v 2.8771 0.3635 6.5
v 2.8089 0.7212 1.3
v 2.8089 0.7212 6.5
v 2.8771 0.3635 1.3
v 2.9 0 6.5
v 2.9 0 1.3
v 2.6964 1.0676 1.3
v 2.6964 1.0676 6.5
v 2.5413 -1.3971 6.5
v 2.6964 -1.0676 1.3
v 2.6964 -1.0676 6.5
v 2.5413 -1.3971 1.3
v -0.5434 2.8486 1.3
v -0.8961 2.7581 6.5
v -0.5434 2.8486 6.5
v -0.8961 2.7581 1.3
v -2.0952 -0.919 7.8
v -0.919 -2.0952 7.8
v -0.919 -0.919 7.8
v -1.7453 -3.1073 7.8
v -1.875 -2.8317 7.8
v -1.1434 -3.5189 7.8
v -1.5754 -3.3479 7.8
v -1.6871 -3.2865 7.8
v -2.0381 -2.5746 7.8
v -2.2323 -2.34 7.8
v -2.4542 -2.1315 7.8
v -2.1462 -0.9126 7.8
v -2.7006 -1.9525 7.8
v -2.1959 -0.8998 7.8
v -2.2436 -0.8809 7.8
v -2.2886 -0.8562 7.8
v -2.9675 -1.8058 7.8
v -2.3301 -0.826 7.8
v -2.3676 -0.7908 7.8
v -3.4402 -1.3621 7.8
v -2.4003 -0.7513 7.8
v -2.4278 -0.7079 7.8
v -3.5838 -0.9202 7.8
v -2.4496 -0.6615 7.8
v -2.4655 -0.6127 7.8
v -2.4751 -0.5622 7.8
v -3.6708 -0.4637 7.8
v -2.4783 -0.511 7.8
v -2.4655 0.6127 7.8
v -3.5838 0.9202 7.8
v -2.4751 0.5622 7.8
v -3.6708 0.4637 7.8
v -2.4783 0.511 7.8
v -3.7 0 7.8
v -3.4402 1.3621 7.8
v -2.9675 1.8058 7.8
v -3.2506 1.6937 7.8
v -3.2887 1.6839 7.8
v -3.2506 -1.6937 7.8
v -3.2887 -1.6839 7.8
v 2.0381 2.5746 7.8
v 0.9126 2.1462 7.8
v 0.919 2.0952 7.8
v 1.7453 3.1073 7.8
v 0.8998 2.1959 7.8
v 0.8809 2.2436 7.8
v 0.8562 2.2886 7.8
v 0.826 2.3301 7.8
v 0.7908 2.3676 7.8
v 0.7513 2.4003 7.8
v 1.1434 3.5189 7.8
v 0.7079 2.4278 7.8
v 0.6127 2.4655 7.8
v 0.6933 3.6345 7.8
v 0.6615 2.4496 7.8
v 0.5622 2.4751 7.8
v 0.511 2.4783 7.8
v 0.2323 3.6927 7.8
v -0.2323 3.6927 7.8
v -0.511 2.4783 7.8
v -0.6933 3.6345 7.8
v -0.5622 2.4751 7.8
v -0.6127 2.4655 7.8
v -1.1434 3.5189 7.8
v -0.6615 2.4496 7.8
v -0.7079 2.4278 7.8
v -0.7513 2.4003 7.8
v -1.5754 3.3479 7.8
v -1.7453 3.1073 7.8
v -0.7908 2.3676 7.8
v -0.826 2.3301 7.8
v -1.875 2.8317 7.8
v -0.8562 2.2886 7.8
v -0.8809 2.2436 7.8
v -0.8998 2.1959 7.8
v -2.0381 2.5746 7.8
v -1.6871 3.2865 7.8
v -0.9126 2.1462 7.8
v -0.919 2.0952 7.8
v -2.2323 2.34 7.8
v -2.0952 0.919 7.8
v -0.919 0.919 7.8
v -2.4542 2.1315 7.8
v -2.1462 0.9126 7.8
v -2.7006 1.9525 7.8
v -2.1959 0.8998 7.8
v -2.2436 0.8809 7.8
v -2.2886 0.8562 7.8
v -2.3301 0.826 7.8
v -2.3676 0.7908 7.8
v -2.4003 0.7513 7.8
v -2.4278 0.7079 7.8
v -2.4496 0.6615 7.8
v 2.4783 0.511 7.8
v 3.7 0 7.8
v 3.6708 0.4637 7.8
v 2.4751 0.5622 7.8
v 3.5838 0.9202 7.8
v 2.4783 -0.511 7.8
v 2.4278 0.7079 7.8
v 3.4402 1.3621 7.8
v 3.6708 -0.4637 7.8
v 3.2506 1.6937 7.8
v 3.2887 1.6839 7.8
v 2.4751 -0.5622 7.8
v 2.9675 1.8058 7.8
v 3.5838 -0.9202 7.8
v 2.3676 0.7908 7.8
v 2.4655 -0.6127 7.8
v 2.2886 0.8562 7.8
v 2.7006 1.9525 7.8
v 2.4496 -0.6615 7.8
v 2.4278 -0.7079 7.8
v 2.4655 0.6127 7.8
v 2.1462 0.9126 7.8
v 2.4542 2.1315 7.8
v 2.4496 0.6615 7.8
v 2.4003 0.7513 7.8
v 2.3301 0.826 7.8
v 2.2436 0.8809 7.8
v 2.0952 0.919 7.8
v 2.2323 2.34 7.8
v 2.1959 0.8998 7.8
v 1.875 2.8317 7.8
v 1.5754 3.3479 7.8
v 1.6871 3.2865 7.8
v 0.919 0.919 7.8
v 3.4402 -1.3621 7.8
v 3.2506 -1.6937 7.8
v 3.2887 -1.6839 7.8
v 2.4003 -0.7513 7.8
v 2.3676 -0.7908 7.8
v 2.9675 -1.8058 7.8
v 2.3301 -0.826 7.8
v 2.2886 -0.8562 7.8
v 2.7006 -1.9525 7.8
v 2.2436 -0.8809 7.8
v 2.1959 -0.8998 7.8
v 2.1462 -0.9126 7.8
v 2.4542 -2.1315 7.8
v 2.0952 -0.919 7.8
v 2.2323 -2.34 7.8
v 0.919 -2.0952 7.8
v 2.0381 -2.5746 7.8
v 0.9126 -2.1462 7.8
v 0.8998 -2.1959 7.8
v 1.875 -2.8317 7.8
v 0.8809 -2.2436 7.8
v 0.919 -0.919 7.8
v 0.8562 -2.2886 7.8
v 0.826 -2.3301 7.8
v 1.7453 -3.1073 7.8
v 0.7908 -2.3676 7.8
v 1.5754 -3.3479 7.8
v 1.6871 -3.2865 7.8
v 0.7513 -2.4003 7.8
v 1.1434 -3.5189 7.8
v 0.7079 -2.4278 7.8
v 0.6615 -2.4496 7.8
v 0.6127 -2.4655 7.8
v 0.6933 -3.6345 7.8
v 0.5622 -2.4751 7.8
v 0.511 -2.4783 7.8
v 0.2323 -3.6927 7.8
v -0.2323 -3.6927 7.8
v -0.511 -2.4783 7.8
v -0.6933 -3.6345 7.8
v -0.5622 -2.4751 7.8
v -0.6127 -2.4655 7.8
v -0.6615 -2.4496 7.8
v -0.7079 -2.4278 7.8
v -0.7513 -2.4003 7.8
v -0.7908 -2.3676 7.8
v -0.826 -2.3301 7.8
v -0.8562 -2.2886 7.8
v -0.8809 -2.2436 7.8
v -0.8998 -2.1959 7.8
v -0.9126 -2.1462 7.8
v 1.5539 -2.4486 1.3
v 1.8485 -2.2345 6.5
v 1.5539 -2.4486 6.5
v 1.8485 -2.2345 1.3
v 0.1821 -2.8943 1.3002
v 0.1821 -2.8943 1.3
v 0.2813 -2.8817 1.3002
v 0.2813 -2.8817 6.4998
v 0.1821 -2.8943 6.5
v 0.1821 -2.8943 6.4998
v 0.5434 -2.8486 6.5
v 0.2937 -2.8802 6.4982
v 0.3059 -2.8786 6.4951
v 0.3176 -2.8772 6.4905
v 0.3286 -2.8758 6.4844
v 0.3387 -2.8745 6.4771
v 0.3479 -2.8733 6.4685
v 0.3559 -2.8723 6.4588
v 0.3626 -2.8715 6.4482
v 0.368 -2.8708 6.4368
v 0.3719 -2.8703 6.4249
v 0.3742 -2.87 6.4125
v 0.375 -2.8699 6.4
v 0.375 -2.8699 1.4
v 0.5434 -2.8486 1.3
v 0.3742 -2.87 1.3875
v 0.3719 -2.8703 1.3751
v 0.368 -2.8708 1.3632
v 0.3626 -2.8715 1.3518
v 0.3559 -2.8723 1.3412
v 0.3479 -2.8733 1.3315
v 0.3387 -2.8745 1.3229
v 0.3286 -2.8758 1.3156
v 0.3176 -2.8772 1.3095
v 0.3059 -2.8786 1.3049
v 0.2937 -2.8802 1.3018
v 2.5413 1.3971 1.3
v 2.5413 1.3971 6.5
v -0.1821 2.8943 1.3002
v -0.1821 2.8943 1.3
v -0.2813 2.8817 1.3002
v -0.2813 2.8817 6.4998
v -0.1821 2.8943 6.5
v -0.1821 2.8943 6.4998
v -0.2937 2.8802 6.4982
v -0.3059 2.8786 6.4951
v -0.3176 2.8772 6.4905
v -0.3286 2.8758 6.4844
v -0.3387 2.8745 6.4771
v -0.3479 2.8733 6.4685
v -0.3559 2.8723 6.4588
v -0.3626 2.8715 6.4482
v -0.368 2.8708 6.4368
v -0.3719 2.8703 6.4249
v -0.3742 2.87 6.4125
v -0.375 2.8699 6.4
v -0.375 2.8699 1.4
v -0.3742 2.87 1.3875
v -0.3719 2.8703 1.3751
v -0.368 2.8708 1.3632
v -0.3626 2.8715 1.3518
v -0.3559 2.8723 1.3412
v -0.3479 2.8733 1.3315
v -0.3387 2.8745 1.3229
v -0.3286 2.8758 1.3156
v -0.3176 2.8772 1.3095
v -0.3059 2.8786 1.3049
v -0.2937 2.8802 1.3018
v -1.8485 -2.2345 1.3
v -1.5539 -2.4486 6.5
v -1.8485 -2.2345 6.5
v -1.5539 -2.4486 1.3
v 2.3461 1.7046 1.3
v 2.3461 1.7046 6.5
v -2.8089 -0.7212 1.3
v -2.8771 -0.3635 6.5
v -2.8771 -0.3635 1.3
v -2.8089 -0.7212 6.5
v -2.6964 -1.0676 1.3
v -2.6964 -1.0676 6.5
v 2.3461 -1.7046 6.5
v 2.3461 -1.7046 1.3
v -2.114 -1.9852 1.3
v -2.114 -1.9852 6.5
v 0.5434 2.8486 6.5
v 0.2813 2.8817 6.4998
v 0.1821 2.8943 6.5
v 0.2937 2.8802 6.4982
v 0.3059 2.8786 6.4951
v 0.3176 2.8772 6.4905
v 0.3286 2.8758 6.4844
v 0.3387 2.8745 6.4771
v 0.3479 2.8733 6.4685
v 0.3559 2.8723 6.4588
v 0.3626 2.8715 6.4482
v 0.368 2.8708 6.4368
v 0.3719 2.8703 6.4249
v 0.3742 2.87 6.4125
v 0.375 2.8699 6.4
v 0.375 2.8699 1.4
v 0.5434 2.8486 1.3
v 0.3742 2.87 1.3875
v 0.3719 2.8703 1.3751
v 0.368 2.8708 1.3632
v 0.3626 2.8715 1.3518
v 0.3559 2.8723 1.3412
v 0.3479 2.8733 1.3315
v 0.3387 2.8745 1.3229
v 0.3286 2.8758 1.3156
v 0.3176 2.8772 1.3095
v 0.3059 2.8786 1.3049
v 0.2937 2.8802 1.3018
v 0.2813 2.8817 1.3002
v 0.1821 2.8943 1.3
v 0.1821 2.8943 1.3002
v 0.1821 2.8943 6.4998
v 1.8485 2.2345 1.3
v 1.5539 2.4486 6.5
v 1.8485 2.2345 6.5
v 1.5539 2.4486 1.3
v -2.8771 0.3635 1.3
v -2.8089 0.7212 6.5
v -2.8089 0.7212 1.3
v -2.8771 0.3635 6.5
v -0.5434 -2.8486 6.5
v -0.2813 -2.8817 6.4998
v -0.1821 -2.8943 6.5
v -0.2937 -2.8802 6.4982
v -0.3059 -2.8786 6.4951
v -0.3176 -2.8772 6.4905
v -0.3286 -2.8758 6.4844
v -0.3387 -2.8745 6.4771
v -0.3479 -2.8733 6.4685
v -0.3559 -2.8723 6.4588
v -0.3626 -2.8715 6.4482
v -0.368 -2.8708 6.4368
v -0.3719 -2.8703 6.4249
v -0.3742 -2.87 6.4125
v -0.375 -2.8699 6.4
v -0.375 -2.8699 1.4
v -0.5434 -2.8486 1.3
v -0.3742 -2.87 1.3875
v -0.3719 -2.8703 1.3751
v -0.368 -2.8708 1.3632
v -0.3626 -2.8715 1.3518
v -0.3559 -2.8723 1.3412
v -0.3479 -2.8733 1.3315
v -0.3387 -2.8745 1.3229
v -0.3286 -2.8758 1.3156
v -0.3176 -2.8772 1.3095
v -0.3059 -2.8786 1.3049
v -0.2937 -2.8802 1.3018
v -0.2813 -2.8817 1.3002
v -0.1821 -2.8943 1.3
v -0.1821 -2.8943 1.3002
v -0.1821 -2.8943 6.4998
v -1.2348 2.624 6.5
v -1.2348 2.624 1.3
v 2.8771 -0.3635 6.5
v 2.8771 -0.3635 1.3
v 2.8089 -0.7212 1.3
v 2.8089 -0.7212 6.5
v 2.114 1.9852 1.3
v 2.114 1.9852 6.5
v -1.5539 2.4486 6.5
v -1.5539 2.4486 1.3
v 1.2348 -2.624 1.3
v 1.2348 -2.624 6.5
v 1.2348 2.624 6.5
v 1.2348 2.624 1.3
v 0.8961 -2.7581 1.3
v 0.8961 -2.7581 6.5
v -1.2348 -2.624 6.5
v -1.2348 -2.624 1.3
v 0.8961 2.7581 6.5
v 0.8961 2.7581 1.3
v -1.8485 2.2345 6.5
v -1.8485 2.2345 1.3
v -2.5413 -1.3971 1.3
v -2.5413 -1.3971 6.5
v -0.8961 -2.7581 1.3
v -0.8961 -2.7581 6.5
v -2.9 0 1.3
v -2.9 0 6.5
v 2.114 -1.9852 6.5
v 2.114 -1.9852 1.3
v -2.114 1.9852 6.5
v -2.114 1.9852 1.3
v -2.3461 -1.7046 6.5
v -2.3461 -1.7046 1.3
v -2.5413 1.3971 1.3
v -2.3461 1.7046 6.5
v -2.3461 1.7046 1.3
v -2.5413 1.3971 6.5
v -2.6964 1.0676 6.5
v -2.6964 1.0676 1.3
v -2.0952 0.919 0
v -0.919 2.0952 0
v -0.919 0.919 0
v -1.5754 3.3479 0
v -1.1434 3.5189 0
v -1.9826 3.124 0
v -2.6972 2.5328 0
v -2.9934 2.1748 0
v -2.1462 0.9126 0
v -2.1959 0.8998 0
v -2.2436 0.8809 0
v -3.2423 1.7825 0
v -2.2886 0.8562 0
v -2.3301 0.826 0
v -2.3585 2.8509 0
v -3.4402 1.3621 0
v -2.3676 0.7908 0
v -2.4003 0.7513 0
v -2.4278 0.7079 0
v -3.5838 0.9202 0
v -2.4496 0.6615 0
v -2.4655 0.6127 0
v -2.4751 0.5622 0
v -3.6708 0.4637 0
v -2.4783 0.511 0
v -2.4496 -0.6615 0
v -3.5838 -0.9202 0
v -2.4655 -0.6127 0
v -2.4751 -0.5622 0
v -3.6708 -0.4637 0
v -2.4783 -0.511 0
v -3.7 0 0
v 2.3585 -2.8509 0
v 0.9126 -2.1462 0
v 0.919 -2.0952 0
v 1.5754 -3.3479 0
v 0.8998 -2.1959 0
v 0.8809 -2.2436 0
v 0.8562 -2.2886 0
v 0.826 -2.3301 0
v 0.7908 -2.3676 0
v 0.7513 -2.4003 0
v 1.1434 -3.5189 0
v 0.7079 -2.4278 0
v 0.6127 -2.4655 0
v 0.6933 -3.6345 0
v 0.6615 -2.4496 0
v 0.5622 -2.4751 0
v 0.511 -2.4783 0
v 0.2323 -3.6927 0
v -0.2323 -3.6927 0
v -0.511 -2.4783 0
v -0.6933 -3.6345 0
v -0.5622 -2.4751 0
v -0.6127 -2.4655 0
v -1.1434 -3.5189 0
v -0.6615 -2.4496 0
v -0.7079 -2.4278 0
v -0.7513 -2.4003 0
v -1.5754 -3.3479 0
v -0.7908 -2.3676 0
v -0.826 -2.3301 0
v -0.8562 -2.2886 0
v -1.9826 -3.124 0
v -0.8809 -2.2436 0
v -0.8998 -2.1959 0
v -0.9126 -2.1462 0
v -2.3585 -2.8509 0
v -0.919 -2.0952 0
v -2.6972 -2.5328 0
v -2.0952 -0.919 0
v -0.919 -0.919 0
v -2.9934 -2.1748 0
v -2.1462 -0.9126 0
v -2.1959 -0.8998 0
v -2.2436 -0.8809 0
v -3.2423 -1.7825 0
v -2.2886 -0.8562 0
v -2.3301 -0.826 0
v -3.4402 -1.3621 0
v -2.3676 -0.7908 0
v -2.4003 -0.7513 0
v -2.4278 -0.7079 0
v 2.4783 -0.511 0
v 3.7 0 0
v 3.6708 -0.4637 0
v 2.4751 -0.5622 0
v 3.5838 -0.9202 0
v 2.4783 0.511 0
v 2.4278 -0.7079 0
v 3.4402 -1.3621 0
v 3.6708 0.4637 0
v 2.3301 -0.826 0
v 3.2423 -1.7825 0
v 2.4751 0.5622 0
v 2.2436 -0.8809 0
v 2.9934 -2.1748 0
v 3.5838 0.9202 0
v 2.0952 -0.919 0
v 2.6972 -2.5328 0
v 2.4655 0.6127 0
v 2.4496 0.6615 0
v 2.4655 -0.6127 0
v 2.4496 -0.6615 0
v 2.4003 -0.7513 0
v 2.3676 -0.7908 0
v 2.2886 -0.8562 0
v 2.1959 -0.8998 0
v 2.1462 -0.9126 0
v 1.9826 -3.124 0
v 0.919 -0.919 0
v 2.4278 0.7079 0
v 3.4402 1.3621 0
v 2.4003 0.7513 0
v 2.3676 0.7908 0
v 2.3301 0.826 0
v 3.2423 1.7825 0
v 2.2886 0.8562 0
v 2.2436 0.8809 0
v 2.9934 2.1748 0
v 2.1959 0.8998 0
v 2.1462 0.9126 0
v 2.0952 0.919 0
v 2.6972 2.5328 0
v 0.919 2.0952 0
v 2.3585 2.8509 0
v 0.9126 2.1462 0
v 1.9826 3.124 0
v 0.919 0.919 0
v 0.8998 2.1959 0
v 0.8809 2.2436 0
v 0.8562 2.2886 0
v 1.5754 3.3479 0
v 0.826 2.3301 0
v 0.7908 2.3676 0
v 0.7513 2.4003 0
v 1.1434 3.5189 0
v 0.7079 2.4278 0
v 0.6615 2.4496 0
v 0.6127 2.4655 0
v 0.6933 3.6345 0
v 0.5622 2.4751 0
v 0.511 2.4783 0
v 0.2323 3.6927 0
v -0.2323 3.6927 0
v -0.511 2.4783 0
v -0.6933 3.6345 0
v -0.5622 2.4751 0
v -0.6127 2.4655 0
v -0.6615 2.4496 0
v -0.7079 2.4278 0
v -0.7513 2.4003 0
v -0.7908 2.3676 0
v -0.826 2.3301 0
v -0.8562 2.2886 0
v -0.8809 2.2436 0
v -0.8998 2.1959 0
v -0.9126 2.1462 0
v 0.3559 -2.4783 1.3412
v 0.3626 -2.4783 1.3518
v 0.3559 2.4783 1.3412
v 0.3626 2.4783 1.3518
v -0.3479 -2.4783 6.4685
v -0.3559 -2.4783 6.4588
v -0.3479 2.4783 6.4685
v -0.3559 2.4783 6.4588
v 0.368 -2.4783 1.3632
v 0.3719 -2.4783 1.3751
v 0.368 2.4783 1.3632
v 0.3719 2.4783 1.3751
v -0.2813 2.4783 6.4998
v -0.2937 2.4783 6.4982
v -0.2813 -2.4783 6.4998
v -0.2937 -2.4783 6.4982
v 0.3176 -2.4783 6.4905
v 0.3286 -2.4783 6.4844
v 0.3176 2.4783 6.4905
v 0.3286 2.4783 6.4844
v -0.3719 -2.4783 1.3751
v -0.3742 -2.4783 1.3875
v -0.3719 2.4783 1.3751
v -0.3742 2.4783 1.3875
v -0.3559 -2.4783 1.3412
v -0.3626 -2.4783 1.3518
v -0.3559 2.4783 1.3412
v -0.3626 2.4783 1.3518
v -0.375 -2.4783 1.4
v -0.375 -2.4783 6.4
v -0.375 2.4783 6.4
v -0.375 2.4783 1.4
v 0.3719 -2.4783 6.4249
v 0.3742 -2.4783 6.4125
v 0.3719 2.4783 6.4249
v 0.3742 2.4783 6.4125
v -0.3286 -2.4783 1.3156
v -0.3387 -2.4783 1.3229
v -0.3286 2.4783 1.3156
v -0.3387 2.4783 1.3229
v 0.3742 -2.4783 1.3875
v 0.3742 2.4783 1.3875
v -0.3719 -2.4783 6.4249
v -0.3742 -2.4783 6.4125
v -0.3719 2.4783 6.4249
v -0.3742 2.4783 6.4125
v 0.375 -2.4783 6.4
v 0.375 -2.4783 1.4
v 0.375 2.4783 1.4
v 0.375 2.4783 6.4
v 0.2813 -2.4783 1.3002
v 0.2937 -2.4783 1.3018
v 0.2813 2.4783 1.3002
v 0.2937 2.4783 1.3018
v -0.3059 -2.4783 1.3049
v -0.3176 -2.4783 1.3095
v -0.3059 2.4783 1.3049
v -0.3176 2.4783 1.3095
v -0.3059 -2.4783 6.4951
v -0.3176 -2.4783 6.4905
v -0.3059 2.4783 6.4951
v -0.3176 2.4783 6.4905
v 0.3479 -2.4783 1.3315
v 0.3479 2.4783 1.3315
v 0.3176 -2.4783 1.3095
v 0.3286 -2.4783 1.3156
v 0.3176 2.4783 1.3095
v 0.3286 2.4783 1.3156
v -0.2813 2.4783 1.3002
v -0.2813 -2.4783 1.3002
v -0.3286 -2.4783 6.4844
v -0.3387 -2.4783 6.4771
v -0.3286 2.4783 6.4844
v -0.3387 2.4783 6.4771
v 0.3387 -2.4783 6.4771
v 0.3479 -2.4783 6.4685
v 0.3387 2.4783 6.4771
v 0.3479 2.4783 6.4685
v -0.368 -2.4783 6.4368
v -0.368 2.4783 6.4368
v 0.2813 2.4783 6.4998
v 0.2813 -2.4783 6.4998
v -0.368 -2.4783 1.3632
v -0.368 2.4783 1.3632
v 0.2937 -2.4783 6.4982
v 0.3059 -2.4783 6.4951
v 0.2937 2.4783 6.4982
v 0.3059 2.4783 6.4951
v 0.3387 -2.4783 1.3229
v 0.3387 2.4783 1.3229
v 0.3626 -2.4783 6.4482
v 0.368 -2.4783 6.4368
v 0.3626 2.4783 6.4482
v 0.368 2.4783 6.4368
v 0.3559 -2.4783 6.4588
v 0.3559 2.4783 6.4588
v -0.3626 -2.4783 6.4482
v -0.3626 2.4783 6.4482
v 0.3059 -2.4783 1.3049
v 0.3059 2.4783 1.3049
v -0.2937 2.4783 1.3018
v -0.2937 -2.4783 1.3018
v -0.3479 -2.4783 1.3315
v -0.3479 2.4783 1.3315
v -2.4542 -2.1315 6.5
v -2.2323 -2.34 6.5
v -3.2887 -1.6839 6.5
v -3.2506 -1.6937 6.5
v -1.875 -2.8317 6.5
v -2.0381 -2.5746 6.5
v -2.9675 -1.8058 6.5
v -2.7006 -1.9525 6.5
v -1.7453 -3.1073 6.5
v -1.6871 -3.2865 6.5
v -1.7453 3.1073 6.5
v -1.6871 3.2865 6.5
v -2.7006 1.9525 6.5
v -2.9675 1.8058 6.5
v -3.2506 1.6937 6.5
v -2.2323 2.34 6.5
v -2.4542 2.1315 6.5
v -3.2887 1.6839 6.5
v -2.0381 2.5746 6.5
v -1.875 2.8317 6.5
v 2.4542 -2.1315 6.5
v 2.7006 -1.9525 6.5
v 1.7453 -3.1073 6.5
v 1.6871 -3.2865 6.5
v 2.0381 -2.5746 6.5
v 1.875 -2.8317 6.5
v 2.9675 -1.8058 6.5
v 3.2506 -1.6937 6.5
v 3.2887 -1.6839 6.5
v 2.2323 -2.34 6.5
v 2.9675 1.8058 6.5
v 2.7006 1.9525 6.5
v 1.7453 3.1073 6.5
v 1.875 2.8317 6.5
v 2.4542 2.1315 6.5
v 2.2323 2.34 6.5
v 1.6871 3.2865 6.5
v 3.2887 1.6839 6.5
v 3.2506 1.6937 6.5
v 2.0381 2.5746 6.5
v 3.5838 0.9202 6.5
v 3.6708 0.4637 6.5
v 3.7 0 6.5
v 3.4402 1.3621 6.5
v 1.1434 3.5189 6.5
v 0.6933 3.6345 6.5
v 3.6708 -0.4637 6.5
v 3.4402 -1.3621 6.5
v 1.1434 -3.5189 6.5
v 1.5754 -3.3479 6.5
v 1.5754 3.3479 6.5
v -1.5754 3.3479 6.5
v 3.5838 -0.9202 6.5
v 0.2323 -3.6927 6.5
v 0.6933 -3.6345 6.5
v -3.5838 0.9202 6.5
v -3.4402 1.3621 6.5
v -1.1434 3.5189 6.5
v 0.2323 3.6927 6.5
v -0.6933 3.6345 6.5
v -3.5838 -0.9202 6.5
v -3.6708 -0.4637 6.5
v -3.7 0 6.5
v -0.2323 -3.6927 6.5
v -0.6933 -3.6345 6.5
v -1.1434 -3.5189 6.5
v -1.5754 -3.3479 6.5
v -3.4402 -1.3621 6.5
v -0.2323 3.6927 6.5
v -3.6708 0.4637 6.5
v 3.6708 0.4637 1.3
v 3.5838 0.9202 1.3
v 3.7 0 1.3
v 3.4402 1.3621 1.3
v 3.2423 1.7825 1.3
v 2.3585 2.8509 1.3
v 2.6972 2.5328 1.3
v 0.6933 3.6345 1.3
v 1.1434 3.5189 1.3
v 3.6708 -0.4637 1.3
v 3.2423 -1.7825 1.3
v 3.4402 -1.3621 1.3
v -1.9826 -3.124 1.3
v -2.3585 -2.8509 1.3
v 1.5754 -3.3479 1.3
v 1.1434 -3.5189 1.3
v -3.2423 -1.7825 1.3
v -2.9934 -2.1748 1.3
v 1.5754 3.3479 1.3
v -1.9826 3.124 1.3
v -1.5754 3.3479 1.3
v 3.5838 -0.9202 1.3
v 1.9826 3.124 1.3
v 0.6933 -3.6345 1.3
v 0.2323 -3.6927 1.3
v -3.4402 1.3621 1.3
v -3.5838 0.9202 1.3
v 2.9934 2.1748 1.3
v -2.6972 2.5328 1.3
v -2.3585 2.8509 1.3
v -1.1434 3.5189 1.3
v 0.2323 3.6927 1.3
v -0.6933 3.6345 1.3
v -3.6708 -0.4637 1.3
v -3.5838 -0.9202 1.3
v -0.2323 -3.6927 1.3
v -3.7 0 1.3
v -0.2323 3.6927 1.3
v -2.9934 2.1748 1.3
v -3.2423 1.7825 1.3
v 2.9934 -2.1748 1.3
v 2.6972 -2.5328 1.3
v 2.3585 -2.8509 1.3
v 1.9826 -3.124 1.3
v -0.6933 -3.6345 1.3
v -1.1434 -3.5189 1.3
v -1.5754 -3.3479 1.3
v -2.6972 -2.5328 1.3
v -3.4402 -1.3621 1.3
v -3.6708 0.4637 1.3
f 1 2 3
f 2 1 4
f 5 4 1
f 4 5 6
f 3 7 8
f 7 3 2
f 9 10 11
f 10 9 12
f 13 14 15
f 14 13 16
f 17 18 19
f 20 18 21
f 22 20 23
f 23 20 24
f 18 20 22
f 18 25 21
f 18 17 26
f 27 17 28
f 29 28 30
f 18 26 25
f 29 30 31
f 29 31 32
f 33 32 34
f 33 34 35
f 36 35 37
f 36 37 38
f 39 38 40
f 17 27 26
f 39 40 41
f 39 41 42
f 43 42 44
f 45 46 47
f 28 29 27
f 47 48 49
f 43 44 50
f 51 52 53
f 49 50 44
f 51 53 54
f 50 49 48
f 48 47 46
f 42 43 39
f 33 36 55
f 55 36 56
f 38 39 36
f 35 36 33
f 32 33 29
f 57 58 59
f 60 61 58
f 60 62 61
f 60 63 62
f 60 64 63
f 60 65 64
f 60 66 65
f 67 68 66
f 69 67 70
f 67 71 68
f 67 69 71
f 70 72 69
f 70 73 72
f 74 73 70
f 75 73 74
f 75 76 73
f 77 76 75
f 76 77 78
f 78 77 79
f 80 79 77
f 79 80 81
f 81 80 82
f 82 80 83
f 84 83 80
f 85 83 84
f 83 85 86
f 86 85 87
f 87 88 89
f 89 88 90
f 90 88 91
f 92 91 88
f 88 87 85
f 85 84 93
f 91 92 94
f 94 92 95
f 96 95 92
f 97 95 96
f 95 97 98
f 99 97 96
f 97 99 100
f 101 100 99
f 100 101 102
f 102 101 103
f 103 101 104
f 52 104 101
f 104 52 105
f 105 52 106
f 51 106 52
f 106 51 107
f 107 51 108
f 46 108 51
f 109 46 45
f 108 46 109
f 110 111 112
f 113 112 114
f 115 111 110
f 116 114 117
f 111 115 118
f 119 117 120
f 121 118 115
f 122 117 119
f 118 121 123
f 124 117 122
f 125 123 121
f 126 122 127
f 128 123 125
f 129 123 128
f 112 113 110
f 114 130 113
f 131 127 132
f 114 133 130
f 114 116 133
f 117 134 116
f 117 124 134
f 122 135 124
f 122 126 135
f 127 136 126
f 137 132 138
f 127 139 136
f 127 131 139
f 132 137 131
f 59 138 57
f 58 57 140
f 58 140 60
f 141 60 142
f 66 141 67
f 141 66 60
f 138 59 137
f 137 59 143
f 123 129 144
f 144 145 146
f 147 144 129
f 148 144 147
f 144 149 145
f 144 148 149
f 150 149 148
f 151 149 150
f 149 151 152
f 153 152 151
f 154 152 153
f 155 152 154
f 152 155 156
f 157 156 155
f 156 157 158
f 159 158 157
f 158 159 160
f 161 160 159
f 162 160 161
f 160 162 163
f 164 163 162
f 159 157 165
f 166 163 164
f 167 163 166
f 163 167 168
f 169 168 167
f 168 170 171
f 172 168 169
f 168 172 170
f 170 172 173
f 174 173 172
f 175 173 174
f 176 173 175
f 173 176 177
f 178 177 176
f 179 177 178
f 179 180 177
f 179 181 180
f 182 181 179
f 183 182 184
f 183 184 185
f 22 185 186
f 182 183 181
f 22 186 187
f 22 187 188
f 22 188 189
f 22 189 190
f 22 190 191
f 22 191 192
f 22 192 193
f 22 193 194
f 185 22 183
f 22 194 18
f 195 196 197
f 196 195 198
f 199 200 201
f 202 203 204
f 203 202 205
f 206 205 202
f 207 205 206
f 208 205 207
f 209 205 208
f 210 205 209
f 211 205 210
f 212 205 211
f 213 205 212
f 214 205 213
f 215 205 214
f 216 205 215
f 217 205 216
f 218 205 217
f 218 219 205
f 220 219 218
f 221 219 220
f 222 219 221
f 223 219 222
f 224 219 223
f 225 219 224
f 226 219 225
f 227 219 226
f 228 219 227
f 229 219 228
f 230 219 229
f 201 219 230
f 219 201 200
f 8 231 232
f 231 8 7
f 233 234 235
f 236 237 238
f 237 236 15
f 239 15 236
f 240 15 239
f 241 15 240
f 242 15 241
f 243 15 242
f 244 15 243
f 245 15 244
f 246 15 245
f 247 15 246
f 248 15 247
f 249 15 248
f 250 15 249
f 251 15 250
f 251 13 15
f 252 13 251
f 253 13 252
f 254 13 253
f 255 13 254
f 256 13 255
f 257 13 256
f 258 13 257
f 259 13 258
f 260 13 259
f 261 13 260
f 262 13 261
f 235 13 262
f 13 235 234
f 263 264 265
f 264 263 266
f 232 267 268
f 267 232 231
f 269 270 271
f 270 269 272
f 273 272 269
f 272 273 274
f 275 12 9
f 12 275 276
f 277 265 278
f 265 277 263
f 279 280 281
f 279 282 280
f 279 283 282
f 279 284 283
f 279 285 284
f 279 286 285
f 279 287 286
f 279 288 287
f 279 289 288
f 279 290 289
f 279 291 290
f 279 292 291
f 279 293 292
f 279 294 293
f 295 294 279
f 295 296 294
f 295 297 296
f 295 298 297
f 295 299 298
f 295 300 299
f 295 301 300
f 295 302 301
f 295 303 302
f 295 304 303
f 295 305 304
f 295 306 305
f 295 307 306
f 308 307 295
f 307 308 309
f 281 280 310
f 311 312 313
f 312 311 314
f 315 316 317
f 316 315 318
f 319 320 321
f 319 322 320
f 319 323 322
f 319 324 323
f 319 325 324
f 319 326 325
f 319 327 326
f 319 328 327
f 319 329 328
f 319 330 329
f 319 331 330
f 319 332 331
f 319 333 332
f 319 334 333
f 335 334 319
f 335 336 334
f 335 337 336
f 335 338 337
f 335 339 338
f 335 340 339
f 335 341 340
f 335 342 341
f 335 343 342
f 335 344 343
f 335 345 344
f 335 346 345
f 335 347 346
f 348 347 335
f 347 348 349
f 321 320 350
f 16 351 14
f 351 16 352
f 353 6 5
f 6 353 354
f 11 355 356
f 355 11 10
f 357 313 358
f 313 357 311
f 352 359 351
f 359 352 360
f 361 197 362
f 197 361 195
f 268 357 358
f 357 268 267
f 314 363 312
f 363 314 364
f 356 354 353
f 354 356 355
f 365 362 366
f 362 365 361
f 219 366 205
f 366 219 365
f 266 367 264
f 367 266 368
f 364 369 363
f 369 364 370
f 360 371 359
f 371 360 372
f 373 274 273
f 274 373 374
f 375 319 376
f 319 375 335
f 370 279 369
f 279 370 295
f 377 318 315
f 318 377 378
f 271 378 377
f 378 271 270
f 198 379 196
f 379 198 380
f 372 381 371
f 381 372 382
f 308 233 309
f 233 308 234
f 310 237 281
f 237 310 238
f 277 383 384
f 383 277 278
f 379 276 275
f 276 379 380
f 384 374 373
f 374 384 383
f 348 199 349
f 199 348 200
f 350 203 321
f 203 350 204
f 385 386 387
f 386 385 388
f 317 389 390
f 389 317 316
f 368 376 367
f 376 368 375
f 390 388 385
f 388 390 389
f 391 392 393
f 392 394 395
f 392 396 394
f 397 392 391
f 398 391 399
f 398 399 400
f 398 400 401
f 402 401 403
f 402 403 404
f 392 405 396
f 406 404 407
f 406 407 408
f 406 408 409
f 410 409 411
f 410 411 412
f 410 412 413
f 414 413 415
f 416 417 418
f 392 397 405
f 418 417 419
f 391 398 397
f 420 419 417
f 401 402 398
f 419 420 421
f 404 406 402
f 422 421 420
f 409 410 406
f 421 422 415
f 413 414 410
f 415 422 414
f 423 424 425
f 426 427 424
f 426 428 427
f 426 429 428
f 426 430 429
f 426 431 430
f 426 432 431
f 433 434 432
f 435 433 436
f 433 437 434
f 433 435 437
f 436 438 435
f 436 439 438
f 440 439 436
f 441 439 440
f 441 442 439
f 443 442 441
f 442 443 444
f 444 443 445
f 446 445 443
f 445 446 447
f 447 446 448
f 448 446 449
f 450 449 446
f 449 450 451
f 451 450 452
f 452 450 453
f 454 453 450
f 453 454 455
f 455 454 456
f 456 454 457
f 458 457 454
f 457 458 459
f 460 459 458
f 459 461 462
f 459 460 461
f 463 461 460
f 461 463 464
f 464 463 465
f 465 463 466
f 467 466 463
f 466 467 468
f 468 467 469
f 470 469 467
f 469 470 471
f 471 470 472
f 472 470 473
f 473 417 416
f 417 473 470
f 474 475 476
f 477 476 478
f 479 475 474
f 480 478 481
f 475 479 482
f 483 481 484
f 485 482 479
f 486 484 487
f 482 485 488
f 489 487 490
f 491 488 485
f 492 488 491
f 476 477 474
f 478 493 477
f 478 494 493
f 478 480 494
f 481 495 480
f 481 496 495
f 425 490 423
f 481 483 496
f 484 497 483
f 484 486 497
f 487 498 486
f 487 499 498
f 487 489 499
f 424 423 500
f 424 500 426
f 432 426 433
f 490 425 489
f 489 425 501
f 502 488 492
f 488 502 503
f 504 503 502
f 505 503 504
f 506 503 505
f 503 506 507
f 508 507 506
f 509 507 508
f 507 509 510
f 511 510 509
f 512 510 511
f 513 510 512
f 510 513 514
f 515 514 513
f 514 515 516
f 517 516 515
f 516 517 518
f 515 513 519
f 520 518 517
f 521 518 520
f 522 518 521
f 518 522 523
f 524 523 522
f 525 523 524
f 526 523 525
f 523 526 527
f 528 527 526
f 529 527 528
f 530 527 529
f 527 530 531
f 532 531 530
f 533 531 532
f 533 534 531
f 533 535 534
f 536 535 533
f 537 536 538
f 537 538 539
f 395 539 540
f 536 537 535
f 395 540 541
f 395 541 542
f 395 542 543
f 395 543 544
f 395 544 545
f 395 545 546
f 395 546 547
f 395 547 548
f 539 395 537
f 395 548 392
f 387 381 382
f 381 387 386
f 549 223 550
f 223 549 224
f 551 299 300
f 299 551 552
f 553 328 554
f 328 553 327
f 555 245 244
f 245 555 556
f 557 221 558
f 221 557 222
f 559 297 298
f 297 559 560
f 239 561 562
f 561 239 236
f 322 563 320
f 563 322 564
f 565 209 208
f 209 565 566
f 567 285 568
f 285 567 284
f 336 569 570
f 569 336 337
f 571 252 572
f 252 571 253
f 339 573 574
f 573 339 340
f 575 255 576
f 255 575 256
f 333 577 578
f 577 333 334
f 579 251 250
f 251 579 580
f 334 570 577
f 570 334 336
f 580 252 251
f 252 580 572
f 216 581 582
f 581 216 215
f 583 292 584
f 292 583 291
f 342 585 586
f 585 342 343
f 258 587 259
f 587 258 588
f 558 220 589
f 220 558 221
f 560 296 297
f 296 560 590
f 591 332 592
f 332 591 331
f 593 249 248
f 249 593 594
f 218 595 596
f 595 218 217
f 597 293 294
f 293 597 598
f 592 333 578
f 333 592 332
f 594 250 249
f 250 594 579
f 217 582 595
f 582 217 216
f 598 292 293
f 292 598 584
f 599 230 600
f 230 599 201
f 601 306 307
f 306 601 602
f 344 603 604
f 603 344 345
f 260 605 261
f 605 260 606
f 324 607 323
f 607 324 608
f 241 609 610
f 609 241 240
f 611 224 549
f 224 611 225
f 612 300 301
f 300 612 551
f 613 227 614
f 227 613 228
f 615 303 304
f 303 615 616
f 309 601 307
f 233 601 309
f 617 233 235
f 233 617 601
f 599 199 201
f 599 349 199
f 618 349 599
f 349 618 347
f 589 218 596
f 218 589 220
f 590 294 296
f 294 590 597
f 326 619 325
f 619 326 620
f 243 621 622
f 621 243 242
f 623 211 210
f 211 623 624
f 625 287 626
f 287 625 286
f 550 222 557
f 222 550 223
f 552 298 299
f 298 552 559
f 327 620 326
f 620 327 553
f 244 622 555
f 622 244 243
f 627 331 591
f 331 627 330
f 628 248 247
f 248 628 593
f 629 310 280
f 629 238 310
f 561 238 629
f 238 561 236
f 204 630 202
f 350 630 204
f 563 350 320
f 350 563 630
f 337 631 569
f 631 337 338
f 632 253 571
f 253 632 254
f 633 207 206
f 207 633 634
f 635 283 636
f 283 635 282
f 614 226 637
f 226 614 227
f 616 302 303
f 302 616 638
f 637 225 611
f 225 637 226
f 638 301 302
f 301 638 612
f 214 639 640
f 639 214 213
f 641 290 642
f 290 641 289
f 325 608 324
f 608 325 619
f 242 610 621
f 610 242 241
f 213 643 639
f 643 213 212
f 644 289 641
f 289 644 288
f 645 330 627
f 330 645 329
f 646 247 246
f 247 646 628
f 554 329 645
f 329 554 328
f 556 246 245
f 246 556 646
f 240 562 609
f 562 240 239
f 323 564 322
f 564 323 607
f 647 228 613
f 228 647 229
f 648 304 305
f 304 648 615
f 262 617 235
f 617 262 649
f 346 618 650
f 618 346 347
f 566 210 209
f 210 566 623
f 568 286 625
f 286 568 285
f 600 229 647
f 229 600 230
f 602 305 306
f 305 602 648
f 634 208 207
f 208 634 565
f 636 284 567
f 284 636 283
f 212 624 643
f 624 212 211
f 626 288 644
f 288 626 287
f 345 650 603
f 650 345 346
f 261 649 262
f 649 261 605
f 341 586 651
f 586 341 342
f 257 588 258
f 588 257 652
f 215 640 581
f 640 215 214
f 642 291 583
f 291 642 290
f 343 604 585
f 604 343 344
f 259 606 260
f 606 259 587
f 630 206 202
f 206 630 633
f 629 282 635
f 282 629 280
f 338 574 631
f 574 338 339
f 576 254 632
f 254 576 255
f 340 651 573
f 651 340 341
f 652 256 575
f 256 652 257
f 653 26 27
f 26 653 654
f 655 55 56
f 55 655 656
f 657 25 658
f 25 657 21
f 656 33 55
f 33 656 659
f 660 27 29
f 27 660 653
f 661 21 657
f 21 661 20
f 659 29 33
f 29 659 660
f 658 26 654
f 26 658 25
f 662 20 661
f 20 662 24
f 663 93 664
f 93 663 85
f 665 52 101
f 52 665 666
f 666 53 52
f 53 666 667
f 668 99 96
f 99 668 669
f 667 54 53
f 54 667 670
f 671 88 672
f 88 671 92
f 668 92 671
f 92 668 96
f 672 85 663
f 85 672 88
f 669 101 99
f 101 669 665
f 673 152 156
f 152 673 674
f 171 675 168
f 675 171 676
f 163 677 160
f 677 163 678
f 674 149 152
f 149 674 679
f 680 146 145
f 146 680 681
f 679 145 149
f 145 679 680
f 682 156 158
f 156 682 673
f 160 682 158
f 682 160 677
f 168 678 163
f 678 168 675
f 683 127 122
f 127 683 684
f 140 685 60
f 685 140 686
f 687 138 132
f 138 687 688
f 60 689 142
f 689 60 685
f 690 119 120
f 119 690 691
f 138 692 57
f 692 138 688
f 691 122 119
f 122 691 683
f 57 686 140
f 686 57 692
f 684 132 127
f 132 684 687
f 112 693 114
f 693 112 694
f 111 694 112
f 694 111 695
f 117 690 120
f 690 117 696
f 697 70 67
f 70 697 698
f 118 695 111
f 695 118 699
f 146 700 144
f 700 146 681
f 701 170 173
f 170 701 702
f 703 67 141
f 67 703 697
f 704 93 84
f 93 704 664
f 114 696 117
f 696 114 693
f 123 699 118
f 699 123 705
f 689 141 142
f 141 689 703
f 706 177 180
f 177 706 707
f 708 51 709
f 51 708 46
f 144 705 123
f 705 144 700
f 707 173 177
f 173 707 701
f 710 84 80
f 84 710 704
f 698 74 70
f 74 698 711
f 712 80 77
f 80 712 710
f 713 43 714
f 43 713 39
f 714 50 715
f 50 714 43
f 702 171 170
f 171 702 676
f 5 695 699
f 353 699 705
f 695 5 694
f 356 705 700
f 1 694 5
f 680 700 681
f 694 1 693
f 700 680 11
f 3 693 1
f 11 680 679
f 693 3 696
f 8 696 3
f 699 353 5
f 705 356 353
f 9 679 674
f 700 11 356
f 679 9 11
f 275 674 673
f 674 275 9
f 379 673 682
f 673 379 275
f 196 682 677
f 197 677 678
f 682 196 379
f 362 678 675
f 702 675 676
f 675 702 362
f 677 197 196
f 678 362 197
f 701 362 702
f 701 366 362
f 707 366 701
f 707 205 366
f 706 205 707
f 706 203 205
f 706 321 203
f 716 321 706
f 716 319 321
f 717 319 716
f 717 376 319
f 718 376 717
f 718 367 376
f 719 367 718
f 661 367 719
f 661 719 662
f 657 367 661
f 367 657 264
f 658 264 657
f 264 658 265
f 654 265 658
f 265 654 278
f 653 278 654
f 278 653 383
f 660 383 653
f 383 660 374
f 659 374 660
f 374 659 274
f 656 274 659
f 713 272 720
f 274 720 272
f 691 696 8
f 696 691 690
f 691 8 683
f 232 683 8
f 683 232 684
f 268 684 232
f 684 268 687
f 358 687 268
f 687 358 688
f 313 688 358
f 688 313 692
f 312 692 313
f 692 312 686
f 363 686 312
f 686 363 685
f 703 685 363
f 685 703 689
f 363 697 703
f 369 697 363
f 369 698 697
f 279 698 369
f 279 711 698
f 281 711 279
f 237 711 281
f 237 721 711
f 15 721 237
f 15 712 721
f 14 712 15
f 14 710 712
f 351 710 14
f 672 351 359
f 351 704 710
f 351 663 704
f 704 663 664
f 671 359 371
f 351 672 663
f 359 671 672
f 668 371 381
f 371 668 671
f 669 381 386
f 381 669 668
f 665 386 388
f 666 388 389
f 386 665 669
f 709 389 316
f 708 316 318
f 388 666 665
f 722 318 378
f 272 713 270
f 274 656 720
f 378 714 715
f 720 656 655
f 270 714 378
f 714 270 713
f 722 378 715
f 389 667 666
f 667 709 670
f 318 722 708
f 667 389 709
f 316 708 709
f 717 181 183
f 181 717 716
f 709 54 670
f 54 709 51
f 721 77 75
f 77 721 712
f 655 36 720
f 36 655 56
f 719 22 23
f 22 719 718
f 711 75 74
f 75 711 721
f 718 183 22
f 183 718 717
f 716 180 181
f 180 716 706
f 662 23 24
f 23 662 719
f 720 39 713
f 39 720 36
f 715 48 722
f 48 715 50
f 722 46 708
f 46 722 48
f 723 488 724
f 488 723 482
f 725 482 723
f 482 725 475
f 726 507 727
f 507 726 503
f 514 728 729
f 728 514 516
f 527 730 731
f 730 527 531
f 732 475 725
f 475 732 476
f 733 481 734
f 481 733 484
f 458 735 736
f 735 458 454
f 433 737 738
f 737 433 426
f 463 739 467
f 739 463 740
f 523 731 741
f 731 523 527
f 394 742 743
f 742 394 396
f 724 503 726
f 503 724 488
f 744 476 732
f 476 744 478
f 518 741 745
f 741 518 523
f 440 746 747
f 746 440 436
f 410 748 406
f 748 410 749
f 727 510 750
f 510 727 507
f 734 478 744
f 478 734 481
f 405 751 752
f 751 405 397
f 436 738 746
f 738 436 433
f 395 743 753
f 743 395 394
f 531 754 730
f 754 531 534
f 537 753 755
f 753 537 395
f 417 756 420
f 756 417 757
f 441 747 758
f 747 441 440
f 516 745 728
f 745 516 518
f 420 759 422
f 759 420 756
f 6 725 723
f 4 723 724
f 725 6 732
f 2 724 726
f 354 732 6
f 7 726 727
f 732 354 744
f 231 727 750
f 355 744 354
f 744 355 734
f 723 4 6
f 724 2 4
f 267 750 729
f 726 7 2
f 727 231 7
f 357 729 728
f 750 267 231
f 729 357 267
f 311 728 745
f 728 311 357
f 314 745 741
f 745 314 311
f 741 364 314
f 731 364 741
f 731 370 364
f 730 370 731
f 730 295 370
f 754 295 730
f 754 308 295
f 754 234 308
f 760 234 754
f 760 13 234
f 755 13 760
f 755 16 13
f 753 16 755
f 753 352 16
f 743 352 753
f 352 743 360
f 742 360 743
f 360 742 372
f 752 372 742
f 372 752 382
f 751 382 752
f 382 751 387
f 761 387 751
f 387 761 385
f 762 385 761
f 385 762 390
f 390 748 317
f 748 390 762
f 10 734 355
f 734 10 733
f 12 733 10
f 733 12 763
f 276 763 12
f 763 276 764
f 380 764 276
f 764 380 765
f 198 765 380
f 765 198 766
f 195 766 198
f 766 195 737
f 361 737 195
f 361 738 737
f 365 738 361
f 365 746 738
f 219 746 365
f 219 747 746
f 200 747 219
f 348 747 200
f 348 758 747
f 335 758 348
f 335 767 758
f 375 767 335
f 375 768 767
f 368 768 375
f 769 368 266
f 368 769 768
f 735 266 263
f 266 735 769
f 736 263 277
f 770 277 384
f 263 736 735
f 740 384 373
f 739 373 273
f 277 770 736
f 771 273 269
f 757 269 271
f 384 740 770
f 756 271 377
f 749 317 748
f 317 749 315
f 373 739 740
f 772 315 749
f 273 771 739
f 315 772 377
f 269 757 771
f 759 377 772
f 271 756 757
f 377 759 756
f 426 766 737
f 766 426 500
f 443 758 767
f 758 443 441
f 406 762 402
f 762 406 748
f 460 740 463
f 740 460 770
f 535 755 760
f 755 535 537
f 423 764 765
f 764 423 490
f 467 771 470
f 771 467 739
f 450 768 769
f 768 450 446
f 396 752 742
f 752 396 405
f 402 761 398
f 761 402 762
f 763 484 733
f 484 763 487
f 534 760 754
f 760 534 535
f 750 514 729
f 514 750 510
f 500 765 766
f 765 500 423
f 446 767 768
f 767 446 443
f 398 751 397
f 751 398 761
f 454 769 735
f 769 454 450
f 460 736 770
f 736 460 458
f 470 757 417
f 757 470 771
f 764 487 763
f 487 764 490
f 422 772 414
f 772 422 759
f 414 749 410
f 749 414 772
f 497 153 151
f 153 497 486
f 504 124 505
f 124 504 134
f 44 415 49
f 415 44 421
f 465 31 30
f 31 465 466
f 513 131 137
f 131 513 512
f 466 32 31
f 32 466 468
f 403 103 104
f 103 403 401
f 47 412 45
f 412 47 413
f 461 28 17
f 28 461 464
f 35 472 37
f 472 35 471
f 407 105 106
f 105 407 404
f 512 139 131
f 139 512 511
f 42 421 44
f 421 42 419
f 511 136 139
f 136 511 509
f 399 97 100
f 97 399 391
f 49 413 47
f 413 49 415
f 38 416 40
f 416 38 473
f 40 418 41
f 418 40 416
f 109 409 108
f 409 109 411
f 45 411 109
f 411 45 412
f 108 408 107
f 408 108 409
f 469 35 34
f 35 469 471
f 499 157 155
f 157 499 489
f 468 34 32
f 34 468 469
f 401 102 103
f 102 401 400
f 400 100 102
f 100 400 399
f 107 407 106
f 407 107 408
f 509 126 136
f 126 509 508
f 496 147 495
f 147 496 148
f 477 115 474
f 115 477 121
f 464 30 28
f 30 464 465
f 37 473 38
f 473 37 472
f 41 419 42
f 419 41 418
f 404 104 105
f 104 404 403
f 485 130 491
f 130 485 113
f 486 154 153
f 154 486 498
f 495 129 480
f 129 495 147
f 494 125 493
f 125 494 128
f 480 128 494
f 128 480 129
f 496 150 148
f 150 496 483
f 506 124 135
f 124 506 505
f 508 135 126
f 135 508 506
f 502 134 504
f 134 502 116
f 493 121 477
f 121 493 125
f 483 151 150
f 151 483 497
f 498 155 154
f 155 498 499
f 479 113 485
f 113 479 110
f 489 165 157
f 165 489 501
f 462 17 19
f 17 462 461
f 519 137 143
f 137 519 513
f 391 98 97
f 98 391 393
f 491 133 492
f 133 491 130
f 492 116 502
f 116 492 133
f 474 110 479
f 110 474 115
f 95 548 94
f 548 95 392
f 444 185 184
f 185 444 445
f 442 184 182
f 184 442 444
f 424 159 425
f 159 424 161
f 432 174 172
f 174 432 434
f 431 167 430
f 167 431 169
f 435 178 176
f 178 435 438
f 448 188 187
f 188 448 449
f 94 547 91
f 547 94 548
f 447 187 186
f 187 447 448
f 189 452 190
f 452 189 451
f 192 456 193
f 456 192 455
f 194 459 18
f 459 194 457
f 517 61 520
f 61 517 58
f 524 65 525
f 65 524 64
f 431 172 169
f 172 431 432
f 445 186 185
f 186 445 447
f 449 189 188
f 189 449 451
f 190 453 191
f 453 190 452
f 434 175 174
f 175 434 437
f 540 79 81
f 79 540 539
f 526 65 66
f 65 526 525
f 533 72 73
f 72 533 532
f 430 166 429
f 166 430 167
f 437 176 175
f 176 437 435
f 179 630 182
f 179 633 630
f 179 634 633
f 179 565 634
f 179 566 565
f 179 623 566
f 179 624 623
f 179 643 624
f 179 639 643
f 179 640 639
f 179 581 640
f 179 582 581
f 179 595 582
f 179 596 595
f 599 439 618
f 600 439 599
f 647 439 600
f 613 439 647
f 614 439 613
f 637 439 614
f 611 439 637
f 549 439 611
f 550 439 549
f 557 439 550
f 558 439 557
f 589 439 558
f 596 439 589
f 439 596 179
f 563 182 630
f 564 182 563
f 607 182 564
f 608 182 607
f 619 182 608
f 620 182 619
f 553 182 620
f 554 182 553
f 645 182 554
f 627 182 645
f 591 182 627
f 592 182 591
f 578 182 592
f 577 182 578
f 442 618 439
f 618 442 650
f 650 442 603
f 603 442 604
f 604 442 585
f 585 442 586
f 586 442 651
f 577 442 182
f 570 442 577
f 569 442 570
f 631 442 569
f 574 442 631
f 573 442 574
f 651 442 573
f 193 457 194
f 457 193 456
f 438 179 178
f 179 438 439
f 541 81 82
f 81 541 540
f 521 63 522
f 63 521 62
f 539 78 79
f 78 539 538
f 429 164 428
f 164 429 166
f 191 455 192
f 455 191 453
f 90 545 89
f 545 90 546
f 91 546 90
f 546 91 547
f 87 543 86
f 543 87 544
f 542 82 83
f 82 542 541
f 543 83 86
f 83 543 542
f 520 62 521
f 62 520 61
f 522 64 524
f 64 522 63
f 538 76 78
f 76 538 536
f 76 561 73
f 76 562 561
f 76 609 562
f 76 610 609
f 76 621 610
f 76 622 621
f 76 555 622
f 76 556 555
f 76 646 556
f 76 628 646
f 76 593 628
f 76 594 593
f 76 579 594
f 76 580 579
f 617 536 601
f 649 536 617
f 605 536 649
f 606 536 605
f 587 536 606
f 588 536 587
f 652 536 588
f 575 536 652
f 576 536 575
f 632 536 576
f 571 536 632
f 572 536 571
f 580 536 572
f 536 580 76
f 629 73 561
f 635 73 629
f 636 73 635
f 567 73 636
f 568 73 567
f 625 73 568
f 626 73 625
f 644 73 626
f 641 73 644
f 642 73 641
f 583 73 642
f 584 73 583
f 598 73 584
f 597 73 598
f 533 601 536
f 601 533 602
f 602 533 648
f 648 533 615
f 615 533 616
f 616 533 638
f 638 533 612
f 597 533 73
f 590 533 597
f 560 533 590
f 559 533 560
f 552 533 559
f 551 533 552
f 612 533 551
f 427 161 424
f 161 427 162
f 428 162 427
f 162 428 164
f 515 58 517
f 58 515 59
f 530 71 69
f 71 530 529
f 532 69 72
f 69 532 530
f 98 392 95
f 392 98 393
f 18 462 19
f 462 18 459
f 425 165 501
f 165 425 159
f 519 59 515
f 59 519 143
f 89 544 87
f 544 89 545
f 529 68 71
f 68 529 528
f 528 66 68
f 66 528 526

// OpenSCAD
include <Technic.scad>;

color( "yellow" ) technic_bush( height = 1, stud_cutouts = true );
